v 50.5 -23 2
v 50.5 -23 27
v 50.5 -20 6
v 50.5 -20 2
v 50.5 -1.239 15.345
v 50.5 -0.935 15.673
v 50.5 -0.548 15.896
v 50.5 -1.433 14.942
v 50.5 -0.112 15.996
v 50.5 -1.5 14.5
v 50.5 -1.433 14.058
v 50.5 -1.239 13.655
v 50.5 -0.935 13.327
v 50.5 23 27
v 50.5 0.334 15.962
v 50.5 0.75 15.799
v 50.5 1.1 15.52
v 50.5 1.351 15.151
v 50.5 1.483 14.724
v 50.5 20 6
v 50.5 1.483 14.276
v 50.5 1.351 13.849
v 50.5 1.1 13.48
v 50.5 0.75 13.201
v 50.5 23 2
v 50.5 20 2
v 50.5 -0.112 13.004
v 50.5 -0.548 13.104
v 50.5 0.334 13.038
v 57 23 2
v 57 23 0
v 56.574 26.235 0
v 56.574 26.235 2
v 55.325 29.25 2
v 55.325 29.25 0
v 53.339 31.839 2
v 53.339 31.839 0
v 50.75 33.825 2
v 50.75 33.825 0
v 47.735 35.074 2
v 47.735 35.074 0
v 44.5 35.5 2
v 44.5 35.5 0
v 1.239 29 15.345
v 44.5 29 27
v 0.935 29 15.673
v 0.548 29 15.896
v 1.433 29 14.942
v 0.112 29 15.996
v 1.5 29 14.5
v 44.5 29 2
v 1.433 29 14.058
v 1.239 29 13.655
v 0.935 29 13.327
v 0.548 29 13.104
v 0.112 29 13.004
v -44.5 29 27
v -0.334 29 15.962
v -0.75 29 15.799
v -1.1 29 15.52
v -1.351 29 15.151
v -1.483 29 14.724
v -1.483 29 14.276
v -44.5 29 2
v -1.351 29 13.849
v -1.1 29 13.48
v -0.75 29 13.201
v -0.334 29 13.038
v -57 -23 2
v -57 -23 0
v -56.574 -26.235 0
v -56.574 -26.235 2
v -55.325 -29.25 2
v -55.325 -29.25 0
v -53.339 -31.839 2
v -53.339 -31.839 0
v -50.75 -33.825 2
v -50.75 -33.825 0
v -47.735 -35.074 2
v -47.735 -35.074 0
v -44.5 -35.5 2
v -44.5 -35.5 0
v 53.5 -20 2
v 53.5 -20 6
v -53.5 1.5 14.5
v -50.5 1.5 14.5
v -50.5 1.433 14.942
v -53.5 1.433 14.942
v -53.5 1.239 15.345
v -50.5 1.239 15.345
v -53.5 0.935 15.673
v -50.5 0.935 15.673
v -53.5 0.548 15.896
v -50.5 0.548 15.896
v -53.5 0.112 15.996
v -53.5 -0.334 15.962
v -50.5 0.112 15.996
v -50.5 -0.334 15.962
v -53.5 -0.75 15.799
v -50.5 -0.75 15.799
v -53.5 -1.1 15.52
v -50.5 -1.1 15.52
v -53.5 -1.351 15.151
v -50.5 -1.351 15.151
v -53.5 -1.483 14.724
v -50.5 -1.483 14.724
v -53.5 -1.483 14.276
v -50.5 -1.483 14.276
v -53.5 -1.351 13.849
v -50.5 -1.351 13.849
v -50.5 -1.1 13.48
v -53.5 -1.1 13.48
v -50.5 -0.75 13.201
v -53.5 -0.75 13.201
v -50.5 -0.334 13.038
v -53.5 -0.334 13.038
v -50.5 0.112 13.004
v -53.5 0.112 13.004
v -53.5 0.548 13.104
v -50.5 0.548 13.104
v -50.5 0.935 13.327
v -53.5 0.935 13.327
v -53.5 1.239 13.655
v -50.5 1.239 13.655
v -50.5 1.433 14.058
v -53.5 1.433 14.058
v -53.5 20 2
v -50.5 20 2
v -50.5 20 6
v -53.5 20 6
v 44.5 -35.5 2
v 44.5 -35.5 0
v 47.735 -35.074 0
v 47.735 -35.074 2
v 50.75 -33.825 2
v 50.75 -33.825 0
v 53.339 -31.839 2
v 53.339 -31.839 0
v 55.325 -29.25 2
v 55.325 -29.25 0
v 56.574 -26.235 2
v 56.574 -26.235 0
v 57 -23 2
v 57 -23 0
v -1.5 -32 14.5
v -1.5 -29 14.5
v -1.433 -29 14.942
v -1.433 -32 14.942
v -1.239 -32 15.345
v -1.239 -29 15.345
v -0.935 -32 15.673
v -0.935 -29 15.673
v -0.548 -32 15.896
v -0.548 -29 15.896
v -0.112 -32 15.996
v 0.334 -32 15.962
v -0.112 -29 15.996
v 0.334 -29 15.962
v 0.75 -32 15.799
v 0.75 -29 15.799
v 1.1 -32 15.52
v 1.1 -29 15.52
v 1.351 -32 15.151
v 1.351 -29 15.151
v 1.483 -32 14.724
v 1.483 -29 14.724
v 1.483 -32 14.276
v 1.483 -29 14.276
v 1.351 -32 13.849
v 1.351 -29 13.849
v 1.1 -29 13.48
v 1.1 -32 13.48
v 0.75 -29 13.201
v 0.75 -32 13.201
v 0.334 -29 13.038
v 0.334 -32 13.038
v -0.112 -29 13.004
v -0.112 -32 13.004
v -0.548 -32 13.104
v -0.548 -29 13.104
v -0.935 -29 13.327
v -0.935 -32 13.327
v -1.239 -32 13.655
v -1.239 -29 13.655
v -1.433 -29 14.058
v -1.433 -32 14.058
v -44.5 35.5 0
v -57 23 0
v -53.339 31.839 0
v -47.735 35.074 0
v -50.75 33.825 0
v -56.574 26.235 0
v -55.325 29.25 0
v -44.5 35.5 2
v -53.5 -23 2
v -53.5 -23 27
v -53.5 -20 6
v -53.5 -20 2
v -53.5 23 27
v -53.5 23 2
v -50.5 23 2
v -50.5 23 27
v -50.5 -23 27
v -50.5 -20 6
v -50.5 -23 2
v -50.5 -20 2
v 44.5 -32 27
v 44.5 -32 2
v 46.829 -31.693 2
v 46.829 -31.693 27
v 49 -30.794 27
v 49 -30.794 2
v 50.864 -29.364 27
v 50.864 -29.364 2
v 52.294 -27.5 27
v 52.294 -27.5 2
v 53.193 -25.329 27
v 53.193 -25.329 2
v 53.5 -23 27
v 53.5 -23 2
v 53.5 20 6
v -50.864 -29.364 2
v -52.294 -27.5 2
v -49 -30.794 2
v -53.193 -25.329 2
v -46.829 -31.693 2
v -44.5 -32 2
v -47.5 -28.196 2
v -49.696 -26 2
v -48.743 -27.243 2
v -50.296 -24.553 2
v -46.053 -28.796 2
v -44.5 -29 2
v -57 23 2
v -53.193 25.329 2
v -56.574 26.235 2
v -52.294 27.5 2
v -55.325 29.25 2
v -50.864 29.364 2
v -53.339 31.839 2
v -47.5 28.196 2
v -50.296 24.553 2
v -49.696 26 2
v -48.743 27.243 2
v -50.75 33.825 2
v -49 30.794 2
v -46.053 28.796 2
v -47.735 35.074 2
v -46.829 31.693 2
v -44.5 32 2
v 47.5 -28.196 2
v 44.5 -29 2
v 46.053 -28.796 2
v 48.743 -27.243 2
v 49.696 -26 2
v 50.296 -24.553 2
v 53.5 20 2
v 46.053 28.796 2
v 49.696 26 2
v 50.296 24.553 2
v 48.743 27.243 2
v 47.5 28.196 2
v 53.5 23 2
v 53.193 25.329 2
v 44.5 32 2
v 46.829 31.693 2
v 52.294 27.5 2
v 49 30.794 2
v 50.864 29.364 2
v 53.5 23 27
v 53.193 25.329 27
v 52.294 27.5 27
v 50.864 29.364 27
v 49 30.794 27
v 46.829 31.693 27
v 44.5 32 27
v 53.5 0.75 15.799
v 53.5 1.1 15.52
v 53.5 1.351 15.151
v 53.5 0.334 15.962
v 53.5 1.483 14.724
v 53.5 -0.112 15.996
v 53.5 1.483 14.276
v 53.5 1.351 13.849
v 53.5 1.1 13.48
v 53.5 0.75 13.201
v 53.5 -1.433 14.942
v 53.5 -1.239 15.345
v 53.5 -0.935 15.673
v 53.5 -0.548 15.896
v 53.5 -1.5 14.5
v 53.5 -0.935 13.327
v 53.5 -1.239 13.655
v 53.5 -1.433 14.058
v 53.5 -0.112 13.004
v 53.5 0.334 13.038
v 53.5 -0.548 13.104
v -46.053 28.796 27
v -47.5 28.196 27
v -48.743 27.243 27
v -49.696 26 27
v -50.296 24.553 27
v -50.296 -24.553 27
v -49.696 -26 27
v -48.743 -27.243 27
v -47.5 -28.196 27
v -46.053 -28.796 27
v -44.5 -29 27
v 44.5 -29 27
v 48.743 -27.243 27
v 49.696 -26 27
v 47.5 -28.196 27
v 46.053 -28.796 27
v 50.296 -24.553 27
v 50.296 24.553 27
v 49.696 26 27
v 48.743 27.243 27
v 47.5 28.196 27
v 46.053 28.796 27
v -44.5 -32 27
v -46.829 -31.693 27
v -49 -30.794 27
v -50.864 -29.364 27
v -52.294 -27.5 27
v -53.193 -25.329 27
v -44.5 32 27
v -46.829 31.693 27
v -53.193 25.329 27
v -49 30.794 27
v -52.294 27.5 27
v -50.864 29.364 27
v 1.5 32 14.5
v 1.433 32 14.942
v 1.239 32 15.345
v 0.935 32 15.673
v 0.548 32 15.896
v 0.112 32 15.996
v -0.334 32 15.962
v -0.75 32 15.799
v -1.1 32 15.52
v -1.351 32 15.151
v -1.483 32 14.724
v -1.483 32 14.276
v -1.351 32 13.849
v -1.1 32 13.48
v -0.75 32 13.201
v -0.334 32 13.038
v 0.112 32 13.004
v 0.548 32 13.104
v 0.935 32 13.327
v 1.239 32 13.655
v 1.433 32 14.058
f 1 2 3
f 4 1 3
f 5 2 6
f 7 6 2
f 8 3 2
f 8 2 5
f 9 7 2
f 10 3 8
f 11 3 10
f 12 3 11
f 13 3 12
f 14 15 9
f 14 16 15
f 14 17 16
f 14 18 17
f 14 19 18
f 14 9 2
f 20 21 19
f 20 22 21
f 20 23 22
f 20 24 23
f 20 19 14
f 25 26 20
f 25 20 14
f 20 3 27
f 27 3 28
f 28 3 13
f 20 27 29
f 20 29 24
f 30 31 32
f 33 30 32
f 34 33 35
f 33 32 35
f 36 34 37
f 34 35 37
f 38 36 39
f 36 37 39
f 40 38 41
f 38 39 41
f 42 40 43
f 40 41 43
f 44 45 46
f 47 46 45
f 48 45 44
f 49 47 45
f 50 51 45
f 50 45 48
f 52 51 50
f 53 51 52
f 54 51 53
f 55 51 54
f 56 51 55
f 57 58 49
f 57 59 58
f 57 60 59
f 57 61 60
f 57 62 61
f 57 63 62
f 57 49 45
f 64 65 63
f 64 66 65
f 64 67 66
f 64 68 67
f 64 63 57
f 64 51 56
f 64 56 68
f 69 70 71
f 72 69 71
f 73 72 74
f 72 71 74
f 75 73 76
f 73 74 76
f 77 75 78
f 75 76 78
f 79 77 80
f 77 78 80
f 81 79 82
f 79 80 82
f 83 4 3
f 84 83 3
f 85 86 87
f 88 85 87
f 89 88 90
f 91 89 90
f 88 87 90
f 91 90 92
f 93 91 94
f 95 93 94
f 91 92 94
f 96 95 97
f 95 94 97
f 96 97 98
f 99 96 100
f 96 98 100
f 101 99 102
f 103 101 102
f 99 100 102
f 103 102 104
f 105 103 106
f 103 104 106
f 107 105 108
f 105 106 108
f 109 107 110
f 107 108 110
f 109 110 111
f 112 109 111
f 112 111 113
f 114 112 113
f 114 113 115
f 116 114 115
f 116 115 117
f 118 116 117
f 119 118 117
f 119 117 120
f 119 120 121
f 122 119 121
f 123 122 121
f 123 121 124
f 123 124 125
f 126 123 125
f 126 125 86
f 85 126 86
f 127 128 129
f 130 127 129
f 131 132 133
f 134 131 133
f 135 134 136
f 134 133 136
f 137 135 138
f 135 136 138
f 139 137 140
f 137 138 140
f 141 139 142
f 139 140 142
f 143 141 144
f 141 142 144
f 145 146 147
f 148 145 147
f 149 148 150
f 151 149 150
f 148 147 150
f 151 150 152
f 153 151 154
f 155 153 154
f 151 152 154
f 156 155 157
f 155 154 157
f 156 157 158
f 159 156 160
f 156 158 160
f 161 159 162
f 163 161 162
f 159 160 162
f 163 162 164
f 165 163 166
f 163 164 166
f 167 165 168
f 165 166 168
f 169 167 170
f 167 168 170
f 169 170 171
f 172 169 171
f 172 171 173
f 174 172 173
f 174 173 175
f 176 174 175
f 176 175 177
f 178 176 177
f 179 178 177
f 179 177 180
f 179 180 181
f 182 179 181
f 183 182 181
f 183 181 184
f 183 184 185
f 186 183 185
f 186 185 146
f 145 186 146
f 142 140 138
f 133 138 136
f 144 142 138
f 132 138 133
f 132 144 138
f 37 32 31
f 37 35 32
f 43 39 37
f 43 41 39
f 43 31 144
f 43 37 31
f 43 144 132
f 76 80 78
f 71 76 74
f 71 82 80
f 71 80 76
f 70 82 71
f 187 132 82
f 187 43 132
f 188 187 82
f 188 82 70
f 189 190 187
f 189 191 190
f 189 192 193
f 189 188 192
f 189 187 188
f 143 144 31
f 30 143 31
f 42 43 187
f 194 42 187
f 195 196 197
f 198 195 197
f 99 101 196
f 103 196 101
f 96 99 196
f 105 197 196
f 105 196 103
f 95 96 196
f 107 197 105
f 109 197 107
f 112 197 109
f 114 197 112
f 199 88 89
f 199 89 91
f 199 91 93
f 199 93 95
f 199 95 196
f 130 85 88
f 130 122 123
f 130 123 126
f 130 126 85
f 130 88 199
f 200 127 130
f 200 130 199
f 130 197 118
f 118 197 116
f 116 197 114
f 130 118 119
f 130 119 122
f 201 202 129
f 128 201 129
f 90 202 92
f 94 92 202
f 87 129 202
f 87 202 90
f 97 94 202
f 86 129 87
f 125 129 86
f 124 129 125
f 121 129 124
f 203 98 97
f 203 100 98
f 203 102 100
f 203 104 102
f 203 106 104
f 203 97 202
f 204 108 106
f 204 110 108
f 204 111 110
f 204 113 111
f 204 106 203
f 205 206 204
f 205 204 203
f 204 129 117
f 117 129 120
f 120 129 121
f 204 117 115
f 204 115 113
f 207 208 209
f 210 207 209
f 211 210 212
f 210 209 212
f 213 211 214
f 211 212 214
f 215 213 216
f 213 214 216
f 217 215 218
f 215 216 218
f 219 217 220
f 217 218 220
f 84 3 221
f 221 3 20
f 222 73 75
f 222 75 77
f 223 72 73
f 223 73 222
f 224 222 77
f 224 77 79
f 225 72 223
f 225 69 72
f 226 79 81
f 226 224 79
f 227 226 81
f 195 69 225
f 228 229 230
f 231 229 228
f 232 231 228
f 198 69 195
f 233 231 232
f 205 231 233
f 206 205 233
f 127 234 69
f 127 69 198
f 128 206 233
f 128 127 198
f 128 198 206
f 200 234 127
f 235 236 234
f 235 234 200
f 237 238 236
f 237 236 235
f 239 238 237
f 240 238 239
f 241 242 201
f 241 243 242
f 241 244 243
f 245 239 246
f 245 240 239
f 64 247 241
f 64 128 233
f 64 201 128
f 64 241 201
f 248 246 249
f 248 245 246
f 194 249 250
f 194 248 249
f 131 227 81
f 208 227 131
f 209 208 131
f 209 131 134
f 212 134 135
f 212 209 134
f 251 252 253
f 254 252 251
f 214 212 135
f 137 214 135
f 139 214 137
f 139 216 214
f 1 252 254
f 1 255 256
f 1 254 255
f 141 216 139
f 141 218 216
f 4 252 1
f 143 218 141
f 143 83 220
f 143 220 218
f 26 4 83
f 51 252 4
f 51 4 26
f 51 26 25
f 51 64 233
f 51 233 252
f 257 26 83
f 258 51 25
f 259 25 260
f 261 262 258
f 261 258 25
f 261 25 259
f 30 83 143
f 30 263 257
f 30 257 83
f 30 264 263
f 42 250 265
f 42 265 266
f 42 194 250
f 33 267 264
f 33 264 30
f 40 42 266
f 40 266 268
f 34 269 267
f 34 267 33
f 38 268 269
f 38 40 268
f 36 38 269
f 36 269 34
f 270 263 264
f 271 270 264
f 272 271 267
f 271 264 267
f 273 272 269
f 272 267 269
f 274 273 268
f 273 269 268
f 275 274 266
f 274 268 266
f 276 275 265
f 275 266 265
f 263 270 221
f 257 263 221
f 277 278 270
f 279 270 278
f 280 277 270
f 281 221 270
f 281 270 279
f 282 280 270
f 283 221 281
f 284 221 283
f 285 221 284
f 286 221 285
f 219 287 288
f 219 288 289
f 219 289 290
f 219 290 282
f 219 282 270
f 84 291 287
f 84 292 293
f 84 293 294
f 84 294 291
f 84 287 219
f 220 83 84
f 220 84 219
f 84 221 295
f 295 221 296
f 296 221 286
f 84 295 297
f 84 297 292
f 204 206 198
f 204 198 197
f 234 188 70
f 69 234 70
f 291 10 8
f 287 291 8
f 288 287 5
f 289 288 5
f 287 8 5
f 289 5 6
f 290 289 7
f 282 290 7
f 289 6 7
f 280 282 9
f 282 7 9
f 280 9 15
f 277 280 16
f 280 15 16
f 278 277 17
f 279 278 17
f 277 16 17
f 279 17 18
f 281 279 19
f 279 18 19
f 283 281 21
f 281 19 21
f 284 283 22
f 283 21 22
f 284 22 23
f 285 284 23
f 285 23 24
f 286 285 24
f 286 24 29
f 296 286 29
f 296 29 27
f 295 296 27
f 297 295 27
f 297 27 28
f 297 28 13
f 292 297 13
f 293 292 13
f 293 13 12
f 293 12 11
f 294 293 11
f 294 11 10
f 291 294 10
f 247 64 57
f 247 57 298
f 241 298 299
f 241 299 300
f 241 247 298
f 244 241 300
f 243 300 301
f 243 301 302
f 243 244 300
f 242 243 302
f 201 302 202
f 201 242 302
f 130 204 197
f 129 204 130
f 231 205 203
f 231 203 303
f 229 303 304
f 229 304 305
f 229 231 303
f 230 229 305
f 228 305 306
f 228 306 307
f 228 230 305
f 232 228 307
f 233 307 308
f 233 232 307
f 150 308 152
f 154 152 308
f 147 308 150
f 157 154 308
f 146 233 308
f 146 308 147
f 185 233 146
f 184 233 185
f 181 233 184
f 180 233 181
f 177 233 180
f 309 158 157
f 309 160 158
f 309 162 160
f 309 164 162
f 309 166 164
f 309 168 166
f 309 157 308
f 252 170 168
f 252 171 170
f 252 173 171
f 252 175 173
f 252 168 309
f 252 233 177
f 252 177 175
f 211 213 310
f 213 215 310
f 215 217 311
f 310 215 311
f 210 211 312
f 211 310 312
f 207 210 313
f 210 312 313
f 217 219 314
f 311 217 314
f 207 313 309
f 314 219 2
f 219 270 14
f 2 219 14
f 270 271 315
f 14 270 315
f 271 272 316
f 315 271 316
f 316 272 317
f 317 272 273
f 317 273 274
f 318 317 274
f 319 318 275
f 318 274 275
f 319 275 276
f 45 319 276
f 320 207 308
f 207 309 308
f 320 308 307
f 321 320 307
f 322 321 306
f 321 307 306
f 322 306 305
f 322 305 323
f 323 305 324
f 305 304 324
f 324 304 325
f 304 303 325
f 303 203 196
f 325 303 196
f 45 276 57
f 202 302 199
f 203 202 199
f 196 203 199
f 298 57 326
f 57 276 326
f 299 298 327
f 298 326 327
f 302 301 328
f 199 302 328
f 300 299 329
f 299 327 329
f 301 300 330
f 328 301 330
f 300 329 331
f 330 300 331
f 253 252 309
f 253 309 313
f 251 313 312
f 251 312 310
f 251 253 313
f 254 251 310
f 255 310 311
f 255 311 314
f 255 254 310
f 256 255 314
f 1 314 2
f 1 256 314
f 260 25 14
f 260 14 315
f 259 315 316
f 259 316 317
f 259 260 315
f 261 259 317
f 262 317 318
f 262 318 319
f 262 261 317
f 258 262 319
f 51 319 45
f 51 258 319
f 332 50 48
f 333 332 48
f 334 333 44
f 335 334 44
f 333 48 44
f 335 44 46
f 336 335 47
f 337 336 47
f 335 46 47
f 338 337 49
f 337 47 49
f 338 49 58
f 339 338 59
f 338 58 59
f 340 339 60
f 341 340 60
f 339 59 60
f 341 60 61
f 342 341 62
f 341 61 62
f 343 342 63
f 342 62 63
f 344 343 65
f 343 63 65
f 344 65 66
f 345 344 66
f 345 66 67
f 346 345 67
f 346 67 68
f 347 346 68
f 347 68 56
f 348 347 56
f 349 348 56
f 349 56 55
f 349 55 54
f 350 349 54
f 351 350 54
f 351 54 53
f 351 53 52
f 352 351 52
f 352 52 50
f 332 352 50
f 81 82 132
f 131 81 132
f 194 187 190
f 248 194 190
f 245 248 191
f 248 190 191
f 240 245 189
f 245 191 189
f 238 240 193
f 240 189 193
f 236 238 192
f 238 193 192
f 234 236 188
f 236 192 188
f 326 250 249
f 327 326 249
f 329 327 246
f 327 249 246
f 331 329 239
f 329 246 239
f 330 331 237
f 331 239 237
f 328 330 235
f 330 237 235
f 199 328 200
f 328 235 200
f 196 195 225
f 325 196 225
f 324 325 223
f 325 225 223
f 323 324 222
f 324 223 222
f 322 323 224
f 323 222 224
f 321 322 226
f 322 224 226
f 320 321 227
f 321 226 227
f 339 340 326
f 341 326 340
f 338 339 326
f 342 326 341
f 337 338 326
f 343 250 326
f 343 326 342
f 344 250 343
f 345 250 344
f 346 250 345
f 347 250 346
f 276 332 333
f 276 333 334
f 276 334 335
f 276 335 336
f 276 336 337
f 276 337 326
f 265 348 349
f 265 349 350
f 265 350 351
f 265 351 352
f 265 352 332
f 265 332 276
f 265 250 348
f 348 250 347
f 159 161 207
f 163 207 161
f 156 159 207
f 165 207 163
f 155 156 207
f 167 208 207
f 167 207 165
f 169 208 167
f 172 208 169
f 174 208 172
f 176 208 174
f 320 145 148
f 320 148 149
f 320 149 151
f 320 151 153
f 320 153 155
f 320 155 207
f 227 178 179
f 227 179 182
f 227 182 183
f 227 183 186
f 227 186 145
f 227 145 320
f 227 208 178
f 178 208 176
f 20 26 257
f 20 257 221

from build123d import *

# Parameters (mm, degrees)
PAD001_DEPTH         = 2
PAD003_DEPTH         = 27
SKETCH_R             = 1.5
POCKET_DEPTH         = 309.479101
SKETCH004_W          = 40
SKETCH004_H          = 4
POCKET001_DEPTH      = 57.001
POCKET001_DEPTH_BACK = -57.001
POLARPATTERN_COUNT   = 4


with BuildPart() as part:
    # Sketch001 → Pad001 (new body)
    with BuildSketch(Plane.XY):
        with BuildLine():
            Line((-57, 23), (-57, -23))
            ThreePointArc((-57, -23), (-53.338835, -31.838835), (-44.5, -35.5))
            Line((-44.5, -35.5), (44.5, -35.5))
            ThreePointArc((44.5, -35.5), (53.338835, -31.838835), (57, -23))
            Line((57, -23), (57, 23))
            ThreePointArc((57, 23), (53.338835, 31.838835), (44.5, 35.5))
            Line((44.5, 35.5), (-44.5, 35.5))
            ThreePointArc((-44.5, 35.5), (-53.338835, 31.838835), (-57, 23))
        make_face()
    extrude(amount=PAD001_DEPTH)

    # Sketch003 → Pad003 (join)
    with BuildSketch(Plane.XY):
        with BuildLine():
            Line((-44.5, 32), (44.5, 32))
            ThreePointArc((53.5, 23), (50.863961, 29.363961), (44.5, 32))
            Line((53.5, 23), (53.5, -23))
            ThreePointArc((44.5, -32), (50.863961, -29.363961), (53.5, -23))
            Line((44.5, -32), (-44.5, -32))
            ThreePointArc((-53.5, -23), (-50.863961, -29.363961), (-44.5, -32))
            Line((-53.5, -23), (-53.5, 23))
            ThreePointArc((-44.5, 32), (-50.863961, 29.363961), (-53.5, 23))
        make_face()
        with BuildLine():
            Line((-50.5, 23), (-50.5, -23))
            ThreePointArc((-50.5, -23), (-48.742641, -27.242641), (-44.5, -29))
            Line((-44.5, -29), (44.5, -29))
            ThreePointArc((44.5, -29), (48.742641, -27.242641), (50.5, -23))
            Line((50.5, -23), (50.5, 23))
            ThreePointArc((50.5, 23), (48.742641, 27.242641), (44.5, 29))
            Line((44.5, 29), (-44.5, 29))
            ThreePointArc((-44.5, 29), (-48.742641, 27.242641), (-50.5, 23))
        make_face(mode=Mode.SUBTRACT)
    extrude(amount=PAD003_DEPTH)

    # Sketch → Pocket (cut, through all)
    with BuildSketch(Plane.XZ):
        with Locations((0, 14.5)):
            Circle(SKETCH_R)
    pocket = extrude(amount=-POCKET_DEPTH, mode=Mode.SUBTRACT)

    # Sketch004 → Pocket001 (cut, two sides)
    with BuildSketch(Plane.YZ) as pocket001_sk:
        with Locations((0, 4)):
            Rectangle(SKETCH004_W, SKETCH004_H)
    extrude(amount=-POCKET001_DEPTH, mode=Mode.SUBTRACT)
    extrude(pocket001_sk.sketch, amount=-POCKET001_DEPTH_BACK, mode=Mode.SUBTRACT)

    # PolarPattern: Pocket ×4 about axis
    polarpattern_axis = Axis((0, 0, 0), (0, 0, 1))
    for i in range(1, POLARPATTERN_COUNT):
        add(pocket.rotate(polarpattern_axis, i * 360 / POLARPATTERN_COUNT), mode=Mode.SUBTRACT)


solid = part.part
